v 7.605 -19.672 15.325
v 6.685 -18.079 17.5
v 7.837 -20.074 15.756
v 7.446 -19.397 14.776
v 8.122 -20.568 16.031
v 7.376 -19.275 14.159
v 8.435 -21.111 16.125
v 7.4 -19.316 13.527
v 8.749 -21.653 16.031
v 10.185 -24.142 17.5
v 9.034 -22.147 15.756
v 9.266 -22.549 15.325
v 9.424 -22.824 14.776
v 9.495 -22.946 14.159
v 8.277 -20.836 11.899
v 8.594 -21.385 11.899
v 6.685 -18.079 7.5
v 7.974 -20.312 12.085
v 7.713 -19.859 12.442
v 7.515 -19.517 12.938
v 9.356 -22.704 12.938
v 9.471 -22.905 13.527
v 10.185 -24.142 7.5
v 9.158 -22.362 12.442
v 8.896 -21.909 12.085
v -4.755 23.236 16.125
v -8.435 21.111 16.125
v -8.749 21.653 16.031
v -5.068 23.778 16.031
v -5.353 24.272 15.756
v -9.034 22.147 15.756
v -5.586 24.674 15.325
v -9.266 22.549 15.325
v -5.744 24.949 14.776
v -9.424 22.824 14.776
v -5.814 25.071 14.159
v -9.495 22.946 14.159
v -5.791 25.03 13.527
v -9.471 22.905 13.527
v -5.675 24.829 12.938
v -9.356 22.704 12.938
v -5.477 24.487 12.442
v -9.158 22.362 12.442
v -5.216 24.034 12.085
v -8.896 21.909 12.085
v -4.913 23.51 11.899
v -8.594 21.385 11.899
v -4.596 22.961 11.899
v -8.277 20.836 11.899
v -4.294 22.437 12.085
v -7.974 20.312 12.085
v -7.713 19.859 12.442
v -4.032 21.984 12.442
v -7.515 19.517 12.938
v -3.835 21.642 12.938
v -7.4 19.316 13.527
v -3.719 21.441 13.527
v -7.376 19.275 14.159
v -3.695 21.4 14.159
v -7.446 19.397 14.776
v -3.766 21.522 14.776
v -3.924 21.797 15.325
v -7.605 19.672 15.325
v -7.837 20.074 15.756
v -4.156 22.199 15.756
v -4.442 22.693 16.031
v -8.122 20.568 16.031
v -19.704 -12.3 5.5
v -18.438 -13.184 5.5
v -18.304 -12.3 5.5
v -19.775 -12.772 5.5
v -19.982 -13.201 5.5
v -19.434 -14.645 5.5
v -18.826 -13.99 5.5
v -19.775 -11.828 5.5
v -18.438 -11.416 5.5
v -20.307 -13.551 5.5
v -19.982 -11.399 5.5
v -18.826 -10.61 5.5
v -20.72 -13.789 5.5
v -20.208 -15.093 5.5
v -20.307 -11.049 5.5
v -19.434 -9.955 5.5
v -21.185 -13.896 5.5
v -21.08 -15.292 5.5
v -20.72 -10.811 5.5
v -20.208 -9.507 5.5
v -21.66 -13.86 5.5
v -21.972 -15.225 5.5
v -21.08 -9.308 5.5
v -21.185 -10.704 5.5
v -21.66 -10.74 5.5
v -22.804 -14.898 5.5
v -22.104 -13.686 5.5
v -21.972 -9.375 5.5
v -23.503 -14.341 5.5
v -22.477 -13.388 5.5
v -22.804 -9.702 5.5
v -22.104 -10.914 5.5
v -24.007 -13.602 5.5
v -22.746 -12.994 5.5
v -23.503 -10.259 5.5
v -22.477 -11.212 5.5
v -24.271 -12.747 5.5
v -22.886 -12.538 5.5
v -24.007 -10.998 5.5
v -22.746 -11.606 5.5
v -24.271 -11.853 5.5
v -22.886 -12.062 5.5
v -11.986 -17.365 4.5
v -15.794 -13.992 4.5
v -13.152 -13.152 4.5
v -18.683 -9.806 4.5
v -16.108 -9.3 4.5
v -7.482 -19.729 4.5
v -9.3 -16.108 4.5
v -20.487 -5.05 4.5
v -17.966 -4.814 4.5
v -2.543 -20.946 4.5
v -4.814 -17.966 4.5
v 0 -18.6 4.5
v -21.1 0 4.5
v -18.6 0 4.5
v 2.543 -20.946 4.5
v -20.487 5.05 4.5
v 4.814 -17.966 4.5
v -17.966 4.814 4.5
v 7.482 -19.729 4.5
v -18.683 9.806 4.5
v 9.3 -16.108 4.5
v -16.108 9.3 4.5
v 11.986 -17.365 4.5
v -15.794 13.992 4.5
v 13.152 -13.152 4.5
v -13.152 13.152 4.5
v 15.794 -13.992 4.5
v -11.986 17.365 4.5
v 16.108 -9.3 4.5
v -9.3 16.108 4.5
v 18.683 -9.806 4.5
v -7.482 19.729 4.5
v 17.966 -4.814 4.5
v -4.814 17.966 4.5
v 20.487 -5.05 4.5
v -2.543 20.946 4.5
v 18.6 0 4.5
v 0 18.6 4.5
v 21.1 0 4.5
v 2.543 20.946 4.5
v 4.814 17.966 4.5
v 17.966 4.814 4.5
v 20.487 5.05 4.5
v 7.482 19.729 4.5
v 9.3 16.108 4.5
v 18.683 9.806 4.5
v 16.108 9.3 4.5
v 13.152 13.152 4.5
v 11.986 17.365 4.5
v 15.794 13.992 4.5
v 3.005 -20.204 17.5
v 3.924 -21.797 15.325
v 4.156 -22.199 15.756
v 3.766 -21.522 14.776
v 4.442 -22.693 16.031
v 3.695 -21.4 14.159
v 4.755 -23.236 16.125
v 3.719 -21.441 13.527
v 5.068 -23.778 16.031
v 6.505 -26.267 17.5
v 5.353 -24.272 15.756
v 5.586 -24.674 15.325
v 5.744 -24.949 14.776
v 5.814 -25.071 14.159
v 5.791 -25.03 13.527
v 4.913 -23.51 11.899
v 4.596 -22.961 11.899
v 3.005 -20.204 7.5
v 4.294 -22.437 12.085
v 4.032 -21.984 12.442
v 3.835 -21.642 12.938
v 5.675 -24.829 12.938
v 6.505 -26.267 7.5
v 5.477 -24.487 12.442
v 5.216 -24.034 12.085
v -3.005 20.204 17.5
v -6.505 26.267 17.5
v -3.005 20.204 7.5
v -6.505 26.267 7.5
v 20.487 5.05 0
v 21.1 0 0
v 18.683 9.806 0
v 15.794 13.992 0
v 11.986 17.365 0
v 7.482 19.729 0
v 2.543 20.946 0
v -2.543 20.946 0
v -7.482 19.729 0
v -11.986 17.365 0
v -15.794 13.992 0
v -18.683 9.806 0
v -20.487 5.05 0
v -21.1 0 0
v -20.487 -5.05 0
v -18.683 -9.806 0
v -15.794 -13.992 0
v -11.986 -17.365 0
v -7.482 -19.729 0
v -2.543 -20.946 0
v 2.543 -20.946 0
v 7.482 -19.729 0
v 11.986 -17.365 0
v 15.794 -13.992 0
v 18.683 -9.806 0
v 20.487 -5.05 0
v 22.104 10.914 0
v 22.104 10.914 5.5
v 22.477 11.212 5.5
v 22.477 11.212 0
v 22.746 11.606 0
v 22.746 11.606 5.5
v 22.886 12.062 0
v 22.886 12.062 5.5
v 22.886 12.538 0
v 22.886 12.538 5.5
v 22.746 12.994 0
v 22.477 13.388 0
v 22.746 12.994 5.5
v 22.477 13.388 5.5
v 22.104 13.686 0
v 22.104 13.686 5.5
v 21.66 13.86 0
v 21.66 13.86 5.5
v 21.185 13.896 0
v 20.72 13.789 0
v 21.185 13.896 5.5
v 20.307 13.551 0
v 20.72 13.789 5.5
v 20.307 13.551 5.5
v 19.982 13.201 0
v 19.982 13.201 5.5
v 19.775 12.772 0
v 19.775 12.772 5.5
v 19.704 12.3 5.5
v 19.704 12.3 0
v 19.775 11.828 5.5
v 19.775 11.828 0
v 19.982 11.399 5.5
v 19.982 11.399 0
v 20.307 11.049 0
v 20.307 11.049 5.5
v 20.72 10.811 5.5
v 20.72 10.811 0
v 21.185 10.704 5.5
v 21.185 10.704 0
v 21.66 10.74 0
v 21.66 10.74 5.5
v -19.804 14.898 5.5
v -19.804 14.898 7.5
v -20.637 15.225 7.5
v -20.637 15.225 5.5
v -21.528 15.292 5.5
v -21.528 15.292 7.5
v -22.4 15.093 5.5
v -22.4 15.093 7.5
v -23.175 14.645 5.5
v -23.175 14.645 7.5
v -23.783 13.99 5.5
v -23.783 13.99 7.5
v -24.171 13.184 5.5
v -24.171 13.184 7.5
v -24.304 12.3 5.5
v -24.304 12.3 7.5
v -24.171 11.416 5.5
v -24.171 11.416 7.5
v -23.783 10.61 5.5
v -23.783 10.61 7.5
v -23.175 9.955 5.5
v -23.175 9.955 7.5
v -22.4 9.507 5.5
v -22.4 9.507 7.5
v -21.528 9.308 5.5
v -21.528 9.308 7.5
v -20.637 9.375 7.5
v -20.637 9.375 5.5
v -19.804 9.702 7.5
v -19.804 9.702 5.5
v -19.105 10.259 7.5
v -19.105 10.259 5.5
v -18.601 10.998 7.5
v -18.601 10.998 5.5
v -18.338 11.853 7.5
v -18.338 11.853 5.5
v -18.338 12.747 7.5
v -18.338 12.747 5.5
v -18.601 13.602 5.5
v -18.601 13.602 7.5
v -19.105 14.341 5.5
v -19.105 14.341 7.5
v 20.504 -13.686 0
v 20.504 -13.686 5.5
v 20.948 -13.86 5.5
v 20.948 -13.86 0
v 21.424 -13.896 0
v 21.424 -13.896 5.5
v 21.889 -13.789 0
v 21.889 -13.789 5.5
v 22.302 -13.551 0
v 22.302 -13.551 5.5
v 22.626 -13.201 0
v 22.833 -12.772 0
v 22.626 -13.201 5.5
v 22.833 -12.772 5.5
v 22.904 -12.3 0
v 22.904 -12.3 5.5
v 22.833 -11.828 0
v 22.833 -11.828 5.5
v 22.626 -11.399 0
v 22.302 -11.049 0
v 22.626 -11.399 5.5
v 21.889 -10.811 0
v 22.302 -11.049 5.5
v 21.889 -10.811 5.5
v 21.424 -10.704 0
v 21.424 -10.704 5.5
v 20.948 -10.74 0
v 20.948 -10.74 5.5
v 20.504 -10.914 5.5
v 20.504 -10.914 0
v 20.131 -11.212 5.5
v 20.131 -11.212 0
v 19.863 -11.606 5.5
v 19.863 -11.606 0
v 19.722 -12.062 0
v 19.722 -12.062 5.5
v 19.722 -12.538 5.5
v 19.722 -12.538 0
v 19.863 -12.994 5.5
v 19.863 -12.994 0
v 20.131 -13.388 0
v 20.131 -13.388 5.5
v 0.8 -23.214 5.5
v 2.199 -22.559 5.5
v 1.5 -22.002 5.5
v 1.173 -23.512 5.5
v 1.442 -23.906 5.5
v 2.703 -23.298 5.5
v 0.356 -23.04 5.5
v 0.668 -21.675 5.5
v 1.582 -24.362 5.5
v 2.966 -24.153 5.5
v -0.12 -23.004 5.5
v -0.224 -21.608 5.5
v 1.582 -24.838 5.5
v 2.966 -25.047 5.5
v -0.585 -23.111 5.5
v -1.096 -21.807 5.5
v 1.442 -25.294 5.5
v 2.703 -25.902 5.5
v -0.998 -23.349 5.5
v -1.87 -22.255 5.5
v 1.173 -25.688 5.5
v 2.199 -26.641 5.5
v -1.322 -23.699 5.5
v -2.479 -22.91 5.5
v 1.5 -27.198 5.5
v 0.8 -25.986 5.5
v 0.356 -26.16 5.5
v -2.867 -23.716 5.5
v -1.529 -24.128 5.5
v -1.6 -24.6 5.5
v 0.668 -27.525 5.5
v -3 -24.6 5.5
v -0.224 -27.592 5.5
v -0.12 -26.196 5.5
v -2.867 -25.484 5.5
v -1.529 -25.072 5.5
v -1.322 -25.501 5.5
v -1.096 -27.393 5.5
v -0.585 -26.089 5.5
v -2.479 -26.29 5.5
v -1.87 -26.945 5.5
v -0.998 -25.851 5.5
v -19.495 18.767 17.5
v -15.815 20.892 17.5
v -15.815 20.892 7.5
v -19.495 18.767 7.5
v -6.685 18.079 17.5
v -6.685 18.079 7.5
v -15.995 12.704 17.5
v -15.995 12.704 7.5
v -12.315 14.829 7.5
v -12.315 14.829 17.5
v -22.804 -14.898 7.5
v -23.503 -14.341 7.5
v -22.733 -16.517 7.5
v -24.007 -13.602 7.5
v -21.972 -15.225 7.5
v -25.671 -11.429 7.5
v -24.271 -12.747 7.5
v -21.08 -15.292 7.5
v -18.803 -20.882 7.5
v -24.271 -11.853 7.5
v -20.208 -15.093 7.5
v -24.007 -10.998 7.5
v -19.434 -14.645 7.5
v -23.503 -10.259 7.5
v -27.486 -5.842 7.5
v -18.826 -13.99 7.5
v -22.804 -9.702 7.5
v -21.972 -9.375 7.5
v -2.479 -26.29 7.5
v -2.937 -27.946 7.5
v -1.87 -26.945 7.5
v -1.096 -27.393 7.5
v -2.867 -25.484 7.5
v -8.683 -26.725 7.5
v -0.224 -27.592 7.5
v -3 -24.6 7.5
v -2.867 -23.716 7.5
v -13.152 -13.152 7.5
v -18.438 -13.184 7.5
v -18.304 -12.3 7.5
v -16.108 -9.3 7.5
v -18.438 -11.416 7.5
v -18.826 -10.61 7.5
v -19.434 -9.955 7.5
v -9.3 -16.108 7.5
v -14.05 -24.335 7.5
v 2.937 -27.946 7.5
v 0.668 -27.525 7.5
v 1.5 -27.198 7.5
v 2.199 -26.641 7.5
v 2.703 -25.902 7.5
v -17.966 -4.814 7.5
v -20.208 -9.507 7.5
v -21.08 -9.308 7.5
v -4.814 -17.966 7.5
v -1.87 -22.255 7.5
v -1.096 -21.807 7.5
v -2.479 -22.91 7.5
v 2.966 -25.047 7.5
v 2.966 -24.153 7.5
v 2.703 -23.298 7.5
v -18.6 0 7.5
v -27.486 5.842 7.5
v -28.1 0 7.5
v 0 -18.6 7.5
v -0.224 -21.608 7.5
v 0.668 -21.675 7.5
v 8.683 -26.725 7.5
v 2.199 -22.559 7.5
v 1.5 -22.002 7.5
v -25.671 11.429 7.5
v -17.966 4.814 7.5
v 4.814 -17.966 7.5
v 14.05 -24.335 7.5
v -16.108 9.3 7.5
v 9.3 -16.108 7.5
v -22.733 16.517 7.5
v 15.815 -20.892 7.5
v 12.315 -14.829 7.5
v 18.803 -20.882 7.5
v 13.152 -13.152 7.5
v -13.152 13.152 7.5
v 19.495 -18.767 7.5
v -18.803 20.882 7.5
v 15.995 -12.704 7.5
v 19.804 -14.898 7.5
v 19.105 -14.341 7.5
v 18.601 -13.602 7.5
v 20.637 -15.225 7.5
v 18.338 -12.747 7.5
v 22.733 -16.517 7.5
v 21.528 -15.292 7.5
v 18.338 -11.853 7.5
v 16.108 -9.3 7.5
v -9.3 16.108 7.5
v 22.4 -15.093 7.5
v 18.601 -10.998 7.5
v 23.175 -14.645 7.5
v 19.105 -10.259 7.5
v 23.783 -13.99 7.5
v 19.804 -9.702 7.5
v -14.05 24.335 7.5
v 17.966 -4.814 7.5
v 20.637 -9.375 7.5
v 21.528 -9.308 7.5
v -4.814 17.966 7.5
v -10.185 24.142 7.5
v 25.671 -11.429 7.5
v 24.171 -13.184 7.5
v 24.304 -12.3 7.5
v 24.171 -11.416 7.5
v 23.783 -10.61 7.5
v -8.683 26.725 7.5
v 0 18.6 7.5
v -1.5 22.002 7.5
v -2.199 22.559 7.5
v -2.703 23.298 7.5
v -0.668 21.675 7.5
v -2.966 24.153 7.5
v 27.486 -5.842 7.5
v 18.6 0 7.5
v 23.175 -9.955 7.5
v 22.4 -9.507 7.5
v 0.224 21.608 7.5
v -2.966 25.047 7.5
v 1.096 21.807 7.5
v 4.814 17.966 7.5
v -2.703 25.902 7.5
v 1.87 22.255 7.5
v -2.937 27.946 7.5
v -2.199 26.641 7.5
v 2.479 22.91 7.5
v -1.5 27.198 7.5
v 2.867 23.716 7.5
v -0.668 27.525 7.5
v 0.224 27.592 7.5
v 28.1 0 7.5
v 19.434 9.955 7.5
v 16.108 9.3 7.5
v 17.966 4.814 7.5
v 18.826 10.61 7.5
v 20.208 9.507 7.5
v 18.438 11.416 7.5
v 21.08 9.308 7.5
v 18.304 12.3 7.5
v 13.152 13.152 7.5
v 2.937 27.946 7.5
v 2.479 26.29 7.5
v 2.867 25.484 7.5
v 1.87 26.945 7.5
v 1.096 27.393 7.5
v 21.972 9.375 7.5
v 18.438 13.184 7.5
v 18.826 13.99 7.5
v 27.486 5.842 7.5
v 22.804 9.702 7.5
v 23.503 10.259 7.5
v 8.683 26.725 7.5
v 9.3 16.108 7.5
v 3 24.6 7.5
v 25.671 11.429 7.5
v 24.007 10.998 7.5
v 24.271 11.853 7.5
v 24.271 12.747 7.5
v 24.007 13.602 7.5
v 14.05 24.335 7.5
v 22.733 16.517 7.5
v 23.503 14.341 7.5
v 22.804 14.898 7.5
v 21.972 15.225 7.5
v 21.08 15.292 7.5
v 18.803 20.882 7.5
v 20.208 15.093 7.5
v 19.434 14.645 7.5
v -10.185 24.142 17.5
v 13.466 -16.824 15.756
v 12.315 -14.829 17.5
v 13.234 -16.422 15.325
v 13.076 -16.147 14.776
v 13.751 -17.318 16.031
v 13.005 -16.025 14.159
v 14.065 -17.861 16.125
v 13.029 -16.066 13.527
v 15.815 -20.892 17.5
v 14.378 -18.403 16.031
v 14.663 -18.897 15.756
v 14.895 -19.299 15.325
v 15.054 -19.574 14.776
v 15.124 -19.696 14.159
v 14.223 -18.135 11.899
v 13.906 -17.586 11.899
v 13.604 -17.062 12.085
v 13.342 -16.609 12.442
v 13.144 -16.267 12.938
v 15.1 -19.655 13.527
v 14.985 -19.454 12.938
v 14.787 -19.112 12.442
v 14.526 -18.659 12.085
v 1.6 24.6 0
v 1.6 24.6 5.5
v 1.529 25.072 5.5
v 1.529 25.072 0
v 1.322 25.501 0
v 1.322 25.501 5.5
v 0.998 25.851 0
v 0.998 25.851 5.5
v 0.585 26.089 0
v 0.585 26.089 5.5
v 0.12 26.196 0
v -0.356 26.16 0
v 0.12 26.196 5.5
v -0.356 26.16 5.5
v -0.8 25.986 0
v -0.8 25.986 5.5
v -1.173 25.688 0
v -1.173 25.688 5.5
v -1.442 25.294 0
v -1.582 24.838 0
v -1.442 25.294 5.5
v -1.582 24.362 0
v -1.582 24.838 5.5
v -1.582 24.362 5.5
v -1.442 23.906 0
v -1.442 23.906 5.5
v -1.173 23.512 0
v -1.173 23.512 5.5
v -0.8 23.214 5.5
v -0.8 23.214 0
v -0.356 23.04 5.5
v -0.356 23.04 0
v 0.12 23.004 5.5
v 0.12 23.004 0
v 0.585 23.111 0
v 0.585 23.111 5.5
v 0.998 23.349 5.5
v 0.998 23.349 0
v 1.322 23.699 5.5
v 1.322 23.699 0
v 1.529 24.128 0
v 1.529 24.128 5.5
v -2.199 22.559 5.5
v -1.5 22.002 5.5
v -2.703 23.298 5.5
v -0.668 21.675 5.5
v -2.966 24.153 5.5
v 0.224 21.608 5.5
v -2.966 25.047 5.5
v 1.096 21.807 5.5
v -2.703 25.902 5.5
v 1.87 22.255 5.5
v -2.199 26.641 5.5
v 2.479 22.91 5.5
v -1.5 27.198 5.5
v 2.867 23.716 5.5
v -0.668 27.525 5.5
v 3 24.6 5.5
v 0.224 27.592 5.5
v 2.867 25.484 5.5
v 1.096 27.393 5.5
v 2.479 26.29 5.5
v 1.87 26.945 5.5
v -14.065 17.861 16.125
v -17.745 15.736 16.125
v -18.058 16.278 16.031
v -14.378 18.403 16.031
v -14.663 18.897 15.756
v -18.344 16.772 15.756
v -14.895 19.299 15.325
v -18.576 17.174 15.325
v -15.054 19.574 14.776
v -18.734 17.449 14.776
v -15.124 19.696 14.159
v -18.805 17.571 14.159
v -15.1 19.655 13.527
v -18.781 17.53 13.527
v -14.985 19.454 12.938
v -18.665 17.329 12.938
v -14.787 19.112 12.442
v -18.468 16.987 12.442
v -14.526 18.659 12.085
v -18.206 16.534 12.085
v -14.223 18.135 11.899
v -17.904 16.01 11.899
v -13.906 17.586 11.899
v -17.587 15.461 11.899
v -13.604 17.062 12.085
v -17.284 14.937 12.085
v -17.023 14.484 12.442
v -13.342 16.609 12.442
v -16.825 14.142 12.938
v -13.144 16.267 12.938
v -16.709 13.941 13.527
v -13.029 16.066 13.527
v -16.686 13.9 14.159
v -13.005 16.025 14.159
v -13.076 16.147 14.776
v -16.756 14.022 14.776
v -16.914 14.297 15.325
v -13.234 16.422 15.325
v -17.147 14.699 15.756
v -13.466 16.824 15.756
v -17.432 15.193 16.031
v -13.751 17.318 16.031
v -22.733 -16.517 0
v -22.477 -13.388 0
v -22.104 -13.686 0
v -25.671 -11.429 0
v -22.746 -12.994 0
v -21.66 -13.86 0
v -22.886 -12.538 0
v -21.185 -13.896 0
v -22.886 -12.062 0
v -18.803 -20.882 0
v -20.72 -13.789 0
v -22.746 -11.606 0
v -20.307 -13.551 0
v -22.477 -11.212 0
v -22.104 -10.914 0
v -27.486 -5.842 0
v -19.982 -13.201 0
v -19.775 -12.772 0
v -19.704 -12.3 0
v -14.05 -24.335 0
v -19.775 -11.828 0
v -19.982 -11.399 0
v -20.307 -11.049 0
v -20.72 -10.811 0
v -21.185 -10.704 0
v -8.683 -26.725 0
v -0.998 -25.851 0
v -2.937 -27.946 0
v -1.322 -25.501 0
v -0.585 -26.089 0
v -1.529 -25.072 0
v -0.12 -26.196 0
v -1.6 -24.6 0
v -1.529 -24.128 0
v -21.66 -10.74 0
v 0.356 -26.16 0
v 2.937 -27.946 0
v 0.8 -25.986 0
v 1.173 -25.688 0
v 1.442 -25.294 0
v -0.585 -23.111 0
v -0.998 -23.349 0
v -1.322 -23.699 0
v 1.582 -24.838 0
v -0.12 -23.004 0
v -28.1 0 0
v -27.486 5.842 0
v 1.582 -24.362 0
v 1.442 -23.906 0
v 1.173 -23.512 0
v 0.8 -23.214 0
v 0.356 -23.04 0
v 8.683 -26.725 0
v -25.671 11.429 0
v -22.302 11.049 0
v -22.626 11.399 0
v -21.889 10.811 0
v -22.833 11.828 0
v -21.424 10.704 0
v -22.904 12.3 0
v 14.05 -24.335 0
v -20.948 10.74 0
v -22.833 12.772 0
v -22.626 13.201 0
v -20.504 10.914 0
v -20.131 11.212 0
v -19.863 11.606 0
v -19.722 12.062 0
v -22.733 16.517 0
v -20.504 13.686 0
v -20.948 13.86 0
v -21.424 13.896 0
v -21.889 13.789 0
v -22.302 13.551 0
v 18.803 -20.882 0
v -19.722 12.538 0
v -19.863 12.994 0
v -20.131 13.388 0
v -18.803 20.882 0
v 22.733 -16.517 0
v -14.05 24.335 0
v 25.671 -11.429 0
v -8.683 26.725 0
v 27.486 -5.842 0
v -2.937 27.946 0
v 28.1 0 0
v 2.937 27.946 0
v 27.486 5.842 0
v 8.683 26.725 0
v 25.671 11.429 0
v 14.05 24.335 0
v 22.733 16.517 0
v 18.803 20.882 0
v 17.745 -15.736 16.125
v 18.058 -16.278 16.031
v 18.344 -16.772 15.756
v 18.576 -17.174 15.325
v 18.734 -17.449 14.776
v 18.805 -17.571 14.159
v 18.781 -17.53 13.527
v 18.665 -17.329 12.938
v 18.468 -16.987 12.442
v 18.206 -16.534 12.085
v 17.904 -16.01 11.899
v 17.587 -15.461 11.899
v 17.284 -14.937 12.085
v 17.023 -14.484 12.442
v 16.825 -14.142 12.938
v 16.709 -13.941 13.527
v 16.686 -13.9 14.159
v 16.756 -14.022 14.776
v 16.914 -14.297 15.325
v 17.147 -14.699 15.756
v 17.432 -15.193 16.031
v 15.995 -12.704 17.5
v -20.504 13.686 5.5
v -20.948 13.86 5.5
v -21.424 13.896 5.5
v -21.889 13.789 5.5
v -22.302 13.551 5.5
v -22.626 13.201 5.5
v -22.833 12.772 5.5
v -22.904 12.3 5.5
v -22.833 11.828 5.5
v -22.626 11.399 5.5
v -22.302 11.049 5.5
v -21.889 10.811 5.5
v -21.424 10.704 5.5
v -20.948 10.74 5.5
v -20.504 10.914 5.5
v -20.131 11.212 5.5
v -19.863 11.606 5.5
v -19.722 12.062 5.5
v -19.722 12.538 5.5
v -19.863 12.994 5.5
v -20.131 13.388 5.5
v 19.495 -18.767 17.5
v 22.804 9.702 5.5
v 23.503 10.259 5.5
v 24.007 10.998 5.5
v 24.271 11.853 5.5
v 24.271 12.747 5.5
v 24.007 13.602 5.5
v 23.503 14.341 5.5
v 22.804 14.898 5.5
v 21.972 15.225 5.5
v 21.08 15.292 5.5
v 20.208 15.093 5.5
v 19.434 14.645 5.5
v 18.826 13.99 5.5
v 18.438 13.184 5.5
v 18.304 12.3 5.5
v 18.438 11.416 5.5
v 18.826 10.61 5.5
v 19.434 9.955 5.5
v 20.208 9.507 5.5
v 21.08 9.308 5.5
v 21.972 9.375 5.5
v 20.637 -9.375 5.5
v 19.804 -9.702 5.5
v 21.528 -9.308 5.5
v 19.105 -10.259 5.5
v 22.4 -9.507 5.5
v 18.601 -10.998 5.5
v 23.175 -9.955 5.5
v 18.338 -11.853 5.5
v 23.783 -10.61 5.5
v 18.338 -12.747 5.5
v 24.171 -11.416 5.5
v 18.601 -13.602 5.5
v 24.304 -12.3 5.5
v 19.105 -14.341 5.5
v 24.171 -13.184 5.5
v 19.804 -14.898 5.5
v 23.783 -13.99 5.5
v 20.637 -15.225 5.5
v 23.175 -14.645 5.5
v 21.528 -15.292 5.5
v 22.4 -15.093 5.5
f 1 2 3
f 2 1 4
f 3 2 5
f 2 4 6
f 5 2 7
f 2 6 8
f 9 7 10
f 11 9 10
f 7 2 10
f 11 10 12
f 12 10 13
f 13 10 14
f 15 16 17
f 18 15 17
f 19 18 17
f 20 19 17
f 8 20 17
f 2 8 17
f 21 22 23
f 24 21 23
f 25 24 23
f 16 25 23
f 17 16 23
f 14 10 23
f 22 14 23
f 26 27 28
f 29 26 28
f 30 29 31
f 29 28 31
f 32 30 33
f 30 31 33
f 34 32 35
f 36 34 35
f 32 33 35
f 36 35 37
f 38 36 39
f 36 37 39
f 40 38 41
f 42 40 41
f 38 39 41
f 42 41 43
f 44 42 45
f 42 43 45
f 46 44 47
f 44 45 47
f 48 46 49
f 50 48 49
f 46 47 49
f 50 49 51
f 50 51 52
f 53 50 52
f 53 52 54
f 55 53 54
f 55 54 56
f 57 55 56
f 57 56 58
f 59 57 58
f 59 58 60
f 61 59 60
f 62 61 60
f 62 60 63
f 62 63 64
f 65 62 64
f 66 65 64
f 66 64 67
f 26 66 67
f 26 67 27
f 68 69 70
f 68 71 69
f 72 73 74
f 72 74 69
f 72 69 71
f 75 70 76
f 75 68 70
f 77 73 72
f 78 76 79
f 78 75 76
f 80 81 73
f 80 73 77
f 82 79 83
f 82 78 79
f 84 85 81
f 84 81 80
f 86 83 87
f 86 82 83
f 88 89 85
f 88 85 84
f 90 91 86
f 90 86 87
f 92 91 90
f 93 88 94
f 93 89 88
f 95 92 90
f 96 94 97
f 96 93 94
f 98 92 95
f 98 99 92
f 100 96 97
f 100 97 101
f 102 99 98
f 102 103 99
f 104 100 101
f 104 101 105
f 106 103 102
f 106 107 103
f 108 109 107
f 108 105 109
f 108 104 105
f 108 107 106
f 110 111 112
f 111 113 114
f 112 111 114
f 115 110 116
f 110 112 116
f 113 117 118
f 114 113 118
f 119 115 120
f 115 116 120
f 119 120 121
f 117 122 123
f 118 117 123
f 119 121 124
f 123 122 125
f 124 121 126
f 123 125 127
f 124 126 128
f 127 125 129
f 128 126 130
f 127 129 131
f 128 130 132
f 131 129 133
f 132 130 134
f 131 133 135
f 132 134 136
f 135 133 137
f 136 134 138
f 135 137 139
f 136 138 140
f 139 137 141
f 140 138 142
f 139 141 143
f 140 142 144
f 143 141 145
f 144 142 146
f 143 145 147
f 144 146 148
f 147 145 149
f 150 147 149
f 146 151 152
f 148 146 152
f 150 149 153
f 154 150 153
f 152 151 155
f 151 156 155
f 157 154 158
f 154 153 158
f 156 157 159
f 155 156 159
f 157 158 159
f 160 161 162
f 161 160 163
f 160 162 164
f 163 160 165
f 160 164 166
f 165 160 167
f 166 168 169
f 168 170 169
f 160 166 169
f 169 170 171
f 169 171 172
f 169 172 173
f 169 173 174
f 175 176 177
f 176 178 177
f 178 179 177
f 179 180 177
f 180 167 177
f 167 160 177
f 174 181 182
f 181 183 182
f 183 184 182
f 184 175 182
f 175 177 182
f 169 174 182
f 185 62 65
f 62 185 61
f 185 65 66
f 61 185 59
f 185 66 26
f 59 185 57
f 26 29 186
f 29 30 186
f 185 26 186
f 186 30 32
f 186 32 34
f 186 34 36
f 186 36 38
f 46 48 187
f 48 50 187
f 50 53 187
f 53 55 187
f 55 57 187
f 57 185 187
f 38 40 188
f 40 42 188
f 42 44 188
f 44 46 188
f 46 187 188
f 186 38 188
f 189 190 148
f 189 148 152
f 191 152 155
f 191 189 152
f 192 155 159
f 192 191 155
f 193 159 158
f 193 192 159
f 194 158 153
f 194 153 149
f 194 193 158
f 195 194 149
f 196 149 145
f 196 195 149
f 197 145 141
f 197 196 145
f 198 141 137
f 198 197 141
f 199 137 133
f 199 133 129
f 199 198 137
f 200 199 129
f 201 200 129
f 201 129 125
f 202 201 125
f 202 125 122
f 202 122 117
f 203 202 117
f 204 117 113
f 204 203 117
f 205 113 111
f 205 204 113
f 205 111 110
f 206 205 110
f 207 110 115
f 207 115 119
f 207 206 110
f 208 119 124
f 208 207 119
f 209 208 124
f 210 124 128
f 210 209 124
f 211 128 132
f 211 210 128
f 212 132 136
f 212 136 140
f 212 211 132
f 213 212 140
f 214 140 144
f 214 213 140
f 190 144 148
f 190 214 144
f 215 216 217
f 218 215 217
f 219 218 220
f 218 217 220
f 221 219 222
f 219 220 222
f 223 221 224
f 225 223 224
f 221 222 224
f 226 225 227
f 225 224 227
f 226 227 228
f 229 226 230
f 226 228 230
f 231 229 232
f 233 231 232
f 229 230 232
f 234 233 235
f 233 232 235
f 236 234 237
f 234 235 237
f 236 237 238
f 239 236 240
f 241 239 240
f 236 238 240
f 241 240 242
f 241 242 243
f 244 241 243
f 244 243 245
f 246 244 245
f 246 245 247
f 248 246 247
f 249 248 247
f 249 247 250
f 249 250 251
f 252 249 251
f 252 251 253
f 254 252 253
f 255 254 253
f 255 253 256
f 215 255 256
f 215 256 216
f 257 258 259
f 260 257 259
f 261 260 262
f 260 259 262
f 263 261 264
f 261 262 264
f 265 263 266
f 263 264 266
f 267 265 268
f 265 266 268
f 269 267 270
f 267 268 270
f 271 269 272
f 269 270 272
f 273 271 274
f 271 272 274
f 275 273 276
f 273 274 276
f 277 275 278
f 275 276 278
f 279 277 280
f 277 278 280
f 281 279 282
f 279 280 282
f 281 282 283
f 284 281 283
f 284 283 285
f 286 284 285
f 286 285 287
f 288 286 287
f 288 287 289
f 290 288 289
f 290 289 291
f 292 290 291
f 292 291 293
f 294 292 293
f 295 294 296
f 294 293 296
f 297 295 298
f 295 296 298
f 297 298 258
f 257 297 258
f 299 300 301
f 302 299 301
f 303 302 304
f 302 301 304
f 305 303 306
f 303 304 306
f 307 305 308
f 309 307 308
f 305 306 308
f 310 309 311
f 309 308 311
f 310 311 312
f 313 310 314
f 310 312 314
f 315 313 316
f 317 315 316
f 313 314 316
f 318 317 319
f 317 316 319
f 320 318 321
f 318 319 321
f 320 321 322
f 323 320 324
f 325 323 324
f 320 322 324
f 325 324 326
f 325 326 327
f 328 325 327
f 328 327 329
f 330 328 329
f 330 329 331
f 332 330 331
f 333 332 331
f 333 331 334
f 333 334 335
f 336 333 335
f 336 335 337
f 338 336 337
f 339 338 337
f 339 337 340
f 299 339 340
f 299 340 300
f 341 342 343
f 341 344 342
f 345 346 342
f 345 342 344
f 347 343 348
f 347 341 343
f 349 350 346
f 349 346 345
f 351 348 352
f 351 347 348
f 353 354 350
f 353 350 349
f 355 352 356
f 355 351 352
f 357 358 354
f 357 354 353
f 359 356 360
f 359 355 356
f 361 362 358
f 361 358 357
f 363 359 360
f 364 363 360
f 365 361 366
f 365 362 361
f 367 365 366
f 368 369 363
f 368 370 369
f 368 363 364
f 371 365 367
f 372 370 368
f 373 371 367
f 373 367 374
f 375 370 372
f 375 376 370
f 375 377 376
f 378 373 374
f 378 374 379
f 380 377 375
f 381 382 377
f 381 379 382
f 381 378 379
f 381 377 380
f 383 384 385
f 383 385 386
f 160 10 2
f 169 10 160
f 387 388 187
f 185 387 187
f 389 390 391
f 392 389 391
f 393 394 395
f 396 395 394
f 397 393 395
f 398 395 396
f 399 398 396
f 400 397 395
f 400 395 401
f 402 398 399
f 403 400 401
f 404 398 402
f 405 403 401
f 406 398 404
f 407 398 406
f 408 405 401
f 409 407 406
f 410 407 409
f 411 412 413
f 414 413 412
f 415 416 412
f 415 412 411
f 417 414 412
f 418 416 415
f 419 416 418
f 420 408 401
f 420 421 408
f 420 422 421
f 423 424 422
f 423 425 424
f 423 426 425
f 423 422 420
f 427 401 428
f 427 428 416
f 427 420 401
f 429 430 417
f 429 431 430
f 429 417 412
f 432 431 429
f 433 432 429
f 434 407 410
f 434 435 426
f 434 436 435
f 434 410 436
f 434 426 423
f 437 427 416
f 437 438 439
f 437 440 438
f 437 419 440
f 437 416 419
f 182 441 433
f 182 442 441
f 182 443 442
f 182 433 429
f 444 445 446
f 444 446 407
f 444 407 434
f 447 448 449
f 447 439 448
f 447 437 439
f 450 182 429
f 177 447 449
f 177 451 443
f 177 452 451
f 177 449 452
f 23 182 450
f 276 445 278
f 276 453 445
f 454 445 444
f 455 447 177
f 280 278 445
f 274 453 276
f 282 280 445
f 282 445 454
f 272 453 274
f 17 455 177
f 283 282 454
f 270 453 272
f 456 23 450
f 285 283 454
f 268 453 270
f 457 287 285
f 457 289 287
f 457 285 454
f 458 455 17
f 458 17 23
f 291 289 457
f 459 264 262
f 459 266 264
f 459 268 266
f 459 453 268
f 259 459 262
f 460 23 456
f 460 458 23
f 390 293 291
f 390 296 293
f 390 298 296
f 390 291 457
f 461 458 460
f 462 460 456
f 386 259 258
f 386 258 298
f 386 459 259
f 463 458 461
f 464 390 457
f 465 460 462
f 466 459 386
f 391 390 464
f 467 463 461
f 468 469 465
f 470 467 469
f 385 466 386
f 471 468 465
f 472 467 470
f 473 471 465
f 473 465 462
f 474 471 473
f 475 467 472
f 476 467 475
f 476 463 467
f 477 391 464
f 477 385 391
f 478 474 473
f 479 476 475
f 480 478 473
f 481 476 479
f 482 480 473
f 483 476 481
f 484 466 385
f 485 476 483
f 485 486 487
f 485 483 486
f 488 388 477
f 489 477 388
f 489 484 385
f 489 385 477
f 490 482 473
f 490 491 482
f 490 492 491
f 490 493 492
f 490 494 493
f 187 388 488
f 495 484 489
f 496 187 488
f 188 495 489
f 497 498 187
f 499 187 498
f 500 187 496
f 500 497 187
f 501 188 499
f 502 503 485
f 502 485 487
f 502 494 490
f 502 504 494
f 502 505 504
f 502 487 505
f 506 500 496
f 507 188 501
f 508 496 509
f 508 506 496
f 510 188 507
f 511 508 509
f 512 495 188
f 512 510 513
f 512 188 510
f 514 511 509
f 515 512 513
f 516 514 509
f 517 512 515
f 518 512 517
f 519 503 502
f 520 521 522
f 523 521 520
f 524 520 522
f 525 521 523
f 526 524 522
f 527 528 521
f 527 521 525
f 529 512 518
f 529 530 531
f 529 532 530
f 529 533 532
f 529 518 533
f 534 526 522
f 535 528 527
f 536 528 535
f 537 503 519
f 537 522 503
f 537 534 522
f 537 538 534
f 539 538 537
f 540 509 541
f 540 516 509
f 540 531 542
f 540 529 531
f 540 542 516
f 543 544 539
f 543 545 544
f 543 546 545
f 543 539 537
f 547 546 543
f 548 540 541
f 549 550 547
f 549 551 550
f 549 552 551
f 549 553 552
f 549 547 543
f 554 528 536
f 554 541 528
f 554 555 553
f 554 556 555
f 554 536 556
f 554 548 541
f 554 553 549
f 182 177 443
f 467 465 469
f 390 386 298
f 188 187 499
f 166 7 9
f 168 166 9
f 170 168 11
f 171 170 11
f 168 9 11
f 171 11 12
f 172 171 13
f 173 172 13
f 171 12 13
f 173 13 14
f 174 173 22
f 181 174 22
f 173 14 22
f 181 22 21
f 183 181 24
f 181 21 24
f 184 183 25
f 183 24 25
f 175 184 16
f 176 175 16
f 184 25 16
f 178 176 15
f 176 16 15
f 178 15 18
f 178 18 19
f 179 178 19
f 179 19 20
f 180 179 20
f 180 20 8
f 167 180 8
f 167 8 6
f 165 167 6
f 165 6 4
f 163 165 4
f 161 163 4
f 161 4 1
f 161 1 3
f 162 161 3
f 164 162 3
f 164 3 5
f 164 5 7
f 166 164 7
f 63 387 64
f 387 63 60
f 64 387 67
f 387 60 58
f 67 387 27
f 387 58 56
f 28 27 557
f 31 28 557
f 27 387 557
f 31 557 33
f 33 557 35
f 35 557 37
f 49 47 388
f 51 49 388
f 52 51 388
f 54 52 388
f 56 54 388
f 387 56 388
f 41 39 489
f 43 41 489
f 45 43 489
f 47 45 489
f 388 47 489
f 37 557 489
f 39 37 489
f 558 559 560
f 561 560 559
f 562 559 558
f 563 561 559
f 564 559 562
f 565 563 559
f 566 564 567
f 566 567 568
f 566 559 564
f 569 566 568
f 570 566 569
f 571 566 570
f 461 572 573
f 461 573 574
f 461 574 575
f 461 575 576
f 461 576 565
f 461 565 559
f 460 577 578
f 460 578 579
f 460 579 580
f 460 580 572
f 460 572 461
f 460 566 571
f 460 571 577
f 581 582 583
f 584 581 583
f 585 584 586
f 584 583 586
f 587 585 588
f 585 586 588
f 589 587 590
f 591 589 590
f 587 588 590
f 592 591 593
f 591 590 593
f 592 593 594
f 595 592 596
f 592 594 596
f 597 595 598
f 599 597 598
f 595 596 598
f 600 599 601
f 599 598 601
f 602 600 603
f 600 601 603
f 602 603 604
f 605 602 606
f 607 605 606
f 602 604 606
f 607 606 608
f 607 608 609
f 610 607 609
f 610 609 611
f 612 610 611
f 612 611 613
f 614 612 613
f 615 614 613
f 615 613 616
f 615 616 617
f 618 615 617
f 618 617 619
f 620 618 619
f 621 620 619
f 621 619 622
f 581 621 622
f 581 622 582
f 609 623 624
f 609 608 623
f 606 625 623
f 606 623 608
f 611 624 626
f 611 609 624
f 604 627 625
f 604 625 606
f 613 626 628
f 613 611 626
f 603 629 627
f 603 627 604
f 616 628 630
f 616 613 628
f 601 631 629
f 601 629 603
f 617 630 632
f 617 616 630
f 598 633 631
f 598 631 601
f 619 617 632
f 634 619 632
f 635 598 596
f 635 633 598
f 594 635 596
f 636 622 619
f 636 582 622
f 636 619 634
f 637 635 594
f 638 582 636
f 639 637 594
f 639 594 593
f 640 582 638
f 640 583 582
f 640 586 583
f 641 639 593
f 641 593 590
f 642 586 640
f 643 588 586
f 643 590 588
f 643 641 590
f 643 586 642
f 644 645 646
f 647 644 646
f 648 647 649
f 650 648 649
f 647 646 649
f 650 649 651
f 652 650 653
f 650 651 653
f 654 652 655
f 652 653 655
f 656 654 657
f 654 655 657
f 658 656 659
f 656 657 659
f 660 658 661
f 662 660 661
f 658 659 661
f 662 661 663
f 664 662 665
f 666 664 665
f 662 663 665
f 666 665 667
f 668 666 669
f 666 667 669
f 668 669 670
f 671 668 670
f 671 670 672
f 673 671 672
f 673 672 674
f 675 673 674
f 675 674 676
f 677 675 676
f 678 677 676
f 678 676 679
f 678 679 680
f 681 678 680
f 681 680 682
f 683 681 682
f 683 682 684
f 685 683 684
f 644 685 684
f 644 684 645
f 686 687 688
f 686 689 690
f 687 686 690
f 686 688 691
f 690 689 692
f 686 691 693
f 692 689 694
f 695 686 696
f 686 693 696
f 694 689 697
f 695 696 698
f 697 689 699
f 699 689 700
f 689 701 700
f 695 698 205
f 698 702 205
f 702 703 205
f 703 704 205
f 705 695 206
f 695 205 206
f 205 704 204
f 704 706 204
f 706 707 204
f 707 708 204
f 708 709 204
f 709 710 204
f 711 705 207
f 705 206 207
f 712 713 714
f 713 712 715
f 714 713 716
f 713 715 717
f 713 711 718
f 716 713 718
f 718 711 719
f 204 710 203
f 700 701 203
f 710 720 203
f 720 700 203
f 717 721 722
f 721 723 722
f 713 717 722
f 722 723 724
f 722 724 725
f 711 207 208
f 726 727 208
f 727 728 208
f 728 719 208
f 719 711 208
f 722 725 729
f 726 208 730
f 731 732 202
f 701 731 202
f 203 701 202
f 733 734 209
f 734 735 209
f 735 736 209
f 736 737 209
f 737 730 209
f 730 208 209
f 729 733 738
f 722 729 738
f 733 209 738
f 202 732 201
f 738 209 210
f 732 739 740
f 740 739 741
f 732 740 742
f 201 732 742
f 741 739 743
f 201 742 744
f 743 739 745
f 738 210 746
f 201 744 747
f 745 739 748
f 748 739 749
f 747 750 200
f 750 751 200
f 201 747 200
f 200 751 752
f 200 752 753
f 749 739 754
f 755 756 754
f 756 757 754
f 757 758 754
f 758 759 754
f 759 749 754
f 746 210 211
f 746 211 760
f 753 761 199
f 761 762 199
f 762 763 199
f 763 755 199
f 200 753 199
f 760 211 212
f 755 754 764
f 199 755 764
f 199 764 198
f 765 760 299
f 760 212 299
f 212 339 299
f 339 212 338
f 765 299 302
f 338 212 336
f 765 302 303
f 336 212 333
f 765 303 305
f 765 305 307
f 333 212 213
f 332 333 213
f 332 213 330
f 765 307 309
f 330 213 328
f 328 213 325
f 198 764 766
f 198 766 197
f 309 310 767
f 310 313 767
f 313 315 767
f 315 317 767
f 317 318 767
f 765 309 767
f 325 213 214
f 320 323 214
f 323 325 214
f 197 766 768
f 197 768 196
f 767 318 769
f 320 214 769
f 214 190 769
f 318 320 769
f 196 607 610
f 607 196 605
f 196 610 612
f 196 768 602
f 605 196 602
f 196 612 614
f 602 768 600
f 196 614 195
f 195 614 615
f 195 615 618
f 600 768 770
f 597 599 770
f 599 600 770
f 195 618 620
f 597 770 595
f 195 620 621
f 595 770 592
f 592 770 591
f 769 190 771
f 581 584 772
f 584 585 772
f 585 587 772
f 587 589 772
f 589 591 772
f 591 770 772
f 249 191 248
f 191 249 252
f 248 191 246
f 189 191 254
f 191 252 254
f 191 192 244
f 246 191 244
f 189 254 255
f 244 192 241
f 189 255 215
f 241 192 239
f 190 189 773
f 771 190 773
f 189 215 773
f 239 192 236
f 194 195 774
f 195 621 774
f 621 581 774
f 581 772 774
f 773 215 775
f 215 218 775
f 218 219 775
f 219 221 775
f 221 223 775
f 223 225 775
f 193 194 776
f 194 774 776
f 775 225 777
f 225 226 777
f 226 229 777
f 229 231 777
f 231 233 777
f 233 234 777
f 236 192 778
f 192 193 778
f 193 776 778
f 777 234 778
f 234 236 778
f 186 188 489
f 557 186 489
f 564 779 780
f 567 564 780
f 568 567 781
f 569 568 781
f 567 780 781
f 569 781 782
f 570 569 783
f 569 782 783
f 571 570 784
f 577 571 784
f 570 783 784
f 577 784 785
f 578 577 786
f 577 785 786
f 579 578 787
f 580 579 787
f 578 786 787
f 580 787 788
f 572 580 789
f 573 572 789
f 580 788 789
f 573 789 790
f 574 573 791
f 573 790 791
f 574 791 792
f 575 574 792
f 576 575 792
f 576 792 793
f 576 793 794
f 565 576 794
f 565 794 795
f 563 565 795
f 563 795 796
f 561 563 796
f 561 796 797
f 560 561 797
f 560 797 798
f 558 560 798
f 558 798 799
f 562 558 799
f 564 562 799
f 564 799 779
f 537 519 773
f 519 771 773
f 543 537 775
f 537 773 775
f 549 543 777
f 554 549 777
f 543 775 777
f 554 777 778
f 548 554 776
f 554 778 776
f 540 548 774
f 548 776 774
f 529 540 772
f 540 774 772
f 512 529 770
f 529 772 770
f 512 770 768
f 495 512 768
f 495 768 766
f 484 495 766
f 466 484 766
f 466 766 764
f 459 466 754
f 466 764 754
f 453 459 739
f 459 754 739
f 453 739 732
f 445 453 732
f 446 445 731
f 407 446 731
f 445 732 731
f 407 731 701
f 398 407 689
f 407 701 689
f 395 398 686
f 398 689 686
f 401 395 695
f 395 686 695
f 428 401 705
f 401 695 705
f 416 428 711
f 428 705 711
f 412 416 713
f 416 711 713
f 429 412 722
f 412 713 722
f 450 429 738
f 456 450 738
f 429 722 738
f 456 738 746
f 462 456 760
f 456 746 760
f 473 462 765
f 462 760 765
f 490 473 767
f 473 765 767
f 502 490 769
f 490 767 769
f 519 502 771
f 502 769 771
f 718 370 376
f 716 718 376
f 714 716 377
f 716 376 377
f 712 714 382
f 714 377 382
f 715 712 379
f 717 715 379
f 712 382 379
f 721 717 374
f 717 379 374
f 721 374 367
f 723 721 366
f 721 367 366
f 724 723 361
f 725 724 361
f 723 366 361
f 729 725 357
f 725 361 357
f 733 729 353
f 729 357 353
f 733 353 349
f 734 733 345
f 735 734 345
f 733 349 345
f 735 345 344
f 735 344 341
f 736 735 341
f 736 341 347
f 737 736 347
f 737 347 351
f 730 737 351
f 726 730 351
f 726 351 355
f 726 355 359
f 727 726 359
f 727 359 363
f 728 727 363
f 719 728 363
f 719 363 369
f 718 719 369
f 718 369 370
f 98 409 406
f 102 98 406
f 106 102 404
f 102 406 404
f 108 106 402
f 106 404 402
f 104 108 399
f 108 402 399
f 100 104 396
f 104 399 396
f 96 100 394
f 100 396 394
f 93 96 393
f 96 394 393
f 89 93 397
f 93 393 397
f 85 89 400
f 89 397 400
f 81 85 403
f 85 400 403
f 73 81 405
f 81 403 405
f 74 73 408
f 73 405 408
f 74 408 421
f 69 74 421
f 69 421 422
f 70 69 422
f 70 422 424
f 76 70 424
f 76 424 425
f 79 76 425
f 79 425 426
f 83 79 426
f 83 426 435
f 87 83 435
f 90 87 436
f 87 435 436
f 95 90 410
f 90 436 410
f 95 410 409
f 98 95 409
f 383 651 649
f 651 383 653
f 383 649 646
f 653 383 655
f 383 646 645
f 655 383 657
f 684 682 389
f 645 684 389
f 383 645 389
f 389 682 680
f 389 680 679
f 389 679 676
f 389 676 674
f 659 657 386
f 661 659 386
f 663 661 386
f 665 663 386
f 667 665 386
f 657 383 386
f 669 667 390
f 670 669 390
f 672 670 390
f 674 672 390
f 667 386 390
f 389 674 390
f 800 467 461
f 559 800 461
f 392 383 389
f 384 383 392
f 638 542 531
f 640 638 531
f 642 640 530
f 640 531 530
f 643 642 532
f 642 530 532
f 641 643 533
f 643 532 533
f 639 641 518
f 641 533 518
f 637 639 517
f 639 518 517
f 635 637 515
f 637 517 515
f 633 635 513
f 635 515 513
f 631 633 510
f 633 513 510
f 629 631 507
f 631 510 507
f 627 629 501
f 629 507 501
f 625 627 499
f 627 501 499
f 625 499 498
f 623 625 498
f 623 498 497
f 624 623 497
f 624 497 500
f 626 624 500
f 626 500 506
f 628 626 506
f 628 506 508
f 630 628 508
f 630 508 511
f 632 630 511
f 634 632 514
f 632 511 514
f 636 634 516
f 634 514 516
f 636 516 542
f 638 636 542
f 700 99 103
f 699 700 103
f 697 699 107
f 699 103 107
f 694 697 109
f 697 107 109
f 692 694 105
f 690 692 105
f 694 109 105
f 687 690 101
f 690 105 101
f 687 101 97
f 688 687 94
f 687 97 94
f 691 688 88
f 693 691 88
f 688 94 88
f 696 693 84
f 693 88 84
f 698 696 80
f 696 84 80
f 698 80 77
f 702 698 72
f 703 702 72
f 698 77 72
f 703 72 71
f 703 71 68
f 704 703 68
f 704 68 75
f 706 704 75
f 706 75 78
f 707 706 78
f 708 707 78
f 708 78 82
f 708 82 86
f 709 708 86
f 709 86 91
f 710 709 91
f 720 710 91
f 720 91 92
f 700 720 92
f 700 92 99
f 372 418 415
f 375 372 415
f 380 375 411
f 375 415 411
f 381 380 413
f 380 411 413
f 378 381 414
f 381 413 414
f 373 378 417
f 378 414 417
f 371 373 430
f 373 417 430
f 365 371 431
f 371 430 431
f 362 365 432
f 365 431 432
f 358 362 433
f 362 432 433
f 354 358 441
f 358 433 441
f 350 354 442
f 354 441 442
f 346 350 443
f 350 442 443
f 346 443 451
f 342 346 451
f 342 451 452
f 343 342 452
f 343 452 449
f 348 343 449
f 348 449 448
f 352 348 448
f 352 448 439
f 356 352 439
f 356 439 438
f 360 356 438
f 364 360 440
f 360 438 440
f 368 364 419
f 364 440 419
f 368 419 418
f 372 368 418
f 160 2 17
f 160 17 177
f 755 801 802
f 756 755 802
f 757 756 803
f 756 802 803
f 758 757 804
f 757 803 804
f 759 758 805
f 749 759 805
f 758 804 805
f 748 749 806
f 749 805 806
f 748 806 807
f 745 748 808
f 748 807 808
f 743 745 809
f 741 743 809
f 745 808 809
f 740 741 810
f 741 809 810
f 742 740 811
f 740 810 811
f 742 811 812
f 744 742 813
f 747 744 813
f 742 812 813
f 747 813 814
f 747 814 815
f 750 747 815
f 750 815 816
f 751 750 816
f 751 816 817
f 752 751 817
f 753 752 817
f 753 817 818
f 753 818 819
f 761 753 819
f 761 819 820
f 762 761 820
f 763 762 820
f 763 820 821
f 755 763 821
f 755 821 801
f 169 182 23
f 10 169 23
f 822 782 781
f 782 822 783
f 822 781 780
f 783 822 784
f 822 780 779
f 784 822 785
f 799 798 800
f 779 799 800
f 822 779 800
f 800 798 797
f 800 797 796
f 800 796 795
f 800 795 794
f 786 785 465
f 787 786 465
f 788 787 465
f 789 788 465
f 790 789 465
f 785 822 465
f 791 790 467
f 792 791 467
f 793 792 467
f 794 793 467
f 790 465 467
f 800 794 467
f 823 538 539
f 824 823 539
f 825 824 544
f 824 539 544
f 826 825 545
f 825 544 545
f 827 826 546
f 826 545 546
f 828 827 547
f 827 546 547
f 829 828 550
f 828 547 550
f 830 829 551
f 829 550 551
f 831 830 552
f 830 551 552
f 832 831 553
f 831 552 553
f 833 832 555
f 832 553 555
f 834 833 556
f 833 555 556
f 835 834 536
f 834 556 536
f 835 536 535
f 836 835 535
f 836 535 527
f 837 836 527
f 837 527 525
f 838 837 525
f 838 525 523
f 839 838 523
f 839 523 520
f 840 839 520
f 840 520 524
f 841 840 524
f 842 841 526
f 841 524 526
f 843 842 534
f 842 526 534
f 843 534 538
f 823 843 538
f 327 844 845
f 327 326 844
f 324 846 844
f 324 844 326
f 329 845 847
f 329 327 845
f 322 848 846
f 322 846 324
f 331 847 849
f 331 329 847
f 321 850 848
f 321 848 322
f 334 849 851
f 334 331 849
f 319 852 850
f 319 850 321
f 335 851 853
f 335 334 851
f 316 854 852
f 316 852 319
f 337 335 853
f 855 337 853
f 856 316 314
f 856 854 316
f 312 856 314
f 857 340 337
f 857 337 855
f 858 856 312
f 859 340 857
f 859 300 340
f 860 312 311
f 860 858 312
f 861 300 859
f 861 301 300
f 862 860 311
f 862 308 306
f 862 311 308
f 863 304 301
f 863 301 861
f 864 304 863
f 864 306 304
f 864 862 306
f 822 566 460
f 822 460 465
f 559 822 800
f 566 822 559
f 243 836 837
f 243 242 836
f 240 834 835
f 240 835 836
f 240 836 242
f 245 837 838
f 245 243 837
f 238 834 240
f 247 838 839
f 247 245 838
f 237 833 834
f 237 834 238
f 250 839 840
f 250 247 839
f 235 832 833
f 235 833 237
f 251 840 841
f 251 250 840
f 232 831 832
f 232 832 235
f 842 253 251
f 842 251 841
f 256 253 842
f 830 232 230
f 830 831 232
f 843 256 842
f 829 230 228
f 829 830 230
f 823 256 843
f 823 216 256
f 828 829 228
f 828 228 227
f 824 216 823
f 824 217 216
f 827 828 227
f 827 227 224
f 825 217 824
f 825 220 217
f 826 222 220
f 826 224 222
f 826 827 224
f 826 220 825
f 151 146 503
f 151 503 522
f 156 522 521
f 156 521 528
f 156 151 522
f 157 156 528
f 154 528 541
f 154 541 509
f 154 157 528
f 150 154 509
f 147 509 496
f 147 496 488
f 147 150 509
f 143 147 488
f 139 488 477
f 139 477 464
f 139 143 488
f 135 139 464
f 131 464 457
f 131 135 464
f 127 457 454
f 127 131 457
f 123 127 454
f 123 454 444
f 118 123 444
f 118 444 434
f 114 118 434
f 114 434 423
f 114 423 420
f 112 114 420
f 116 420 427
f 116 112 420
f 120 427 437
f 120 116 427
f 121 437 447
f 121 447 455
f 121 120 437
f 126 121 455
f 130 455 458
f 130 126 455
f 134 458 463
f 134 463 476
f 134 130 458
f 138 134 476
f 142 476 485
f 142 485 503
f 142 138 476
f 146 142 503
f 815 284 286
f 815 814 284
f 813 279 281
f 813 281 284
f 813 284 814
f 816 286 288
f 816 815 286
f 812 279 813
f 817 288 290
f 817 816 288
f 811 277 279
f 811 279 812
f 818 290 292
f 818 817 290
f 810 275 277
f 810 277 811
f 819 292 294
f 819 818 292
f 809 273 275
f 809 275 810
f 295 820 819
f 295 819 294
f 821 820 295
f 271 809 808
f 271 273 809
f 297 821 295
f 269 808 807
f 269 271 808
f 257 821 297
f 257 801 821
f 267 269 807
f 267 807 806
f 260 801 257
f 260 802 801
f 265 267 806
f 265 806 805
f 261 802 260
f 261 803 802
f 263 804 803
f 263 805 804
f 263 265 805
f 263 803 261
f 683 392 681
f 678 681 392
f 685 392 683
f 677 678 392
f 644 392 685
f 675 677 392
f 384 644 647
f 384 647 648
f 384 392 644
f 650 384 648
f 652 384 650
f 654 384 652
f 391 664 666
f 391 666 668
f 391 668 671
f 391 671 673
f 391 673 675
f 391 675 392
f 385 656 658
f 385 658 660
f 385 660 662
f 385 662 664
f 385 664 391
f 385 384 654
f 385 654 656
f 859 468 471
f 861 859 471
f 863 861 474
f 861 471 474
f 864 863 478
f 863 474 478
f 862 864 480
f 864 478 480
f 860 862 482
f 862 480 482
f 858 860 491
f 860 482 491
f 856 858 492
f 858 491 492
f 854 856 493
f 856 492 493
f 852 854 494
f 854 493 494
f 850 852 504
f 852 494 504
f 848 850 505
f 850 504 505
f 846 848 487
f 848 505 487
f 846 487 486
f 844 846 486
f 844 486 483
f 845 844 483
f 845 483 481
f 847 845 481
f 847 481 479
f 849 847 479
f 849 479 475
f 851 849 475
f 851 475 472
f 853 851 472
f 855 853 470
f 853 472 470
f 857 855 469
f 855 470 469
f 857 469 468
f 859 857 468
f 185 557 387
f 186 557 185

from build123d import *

# Parameters (mm, degrees)
SKETCH1_R            = 28.1
SKETCH1_R_2          = 21.1
BOSS_EXTRUDE1_DEPTH  = 4.5
SKETCH2_R            = 28.1
SKETCH2_R_2          = 18.6
BOSS_EXTRUDE2_DEPTH  = 3
M3_CLEARANCE_HOLE1_D = 3.2
SKETCH6_R            = 3
CUT_EXTRUDE1_DEPTH   = 2
BOSS_EXTRUDE3_DEPTH  = 10
SKETCH8_R            = 2.125
CUT_EXTRUDE2_DEPTH   = 15
SKETCH9_W            = 6.5
SKETCH9_H            = 10
CUT_EXTRUDE3_DEPTH   = 7
CIRPATTERN1_COUNT    = 6
CIRPATTERN2_COUNT    = 2


with BuildPart() as part:
    # Sketch1 → Boss-Extrude1 (new body)
    with BuildSketch(Plane.XY):
        Circle(SKETCH1_R)
        Circle(SKETCH1_R_2, mode=Mode.SUBTRACT)
    extrude(amount=BOSS_EXTRUDE1_DEPTH)

    # Sketch2 → Boss-Extrude2 (add)
    with BuildSketch(Plane.XY.offset(4.5)):
        Circle(SKETCH2_R)
        Circle(SKETCH2_R_2, mode=Mode.SUBTRACT)
    extrude(amount=BOSS_EXTRUDE2_DEPTH)

    # M3 Clearance Hole1 (through all)
    with Locations(Plane(origin=(0, 0, 0), x_dir=(-1, 0, 0), z_dir=(0, 0, -1))):
        with Locations((0, 24.6)):
            m3_clearance_hole1 = Hole(M3_CLEARANCE_HOLE1_D / 2)

    # Sketch6 → Cut-Extrude1 (cut)
    with BuildSketch(Plane.XY.offset(7.5)):
        with Locations((0, 24.6)):
            Circle(SKETCH6_R)
    cut_extrude1 = extrude(amount=-CUT_EXTRUDE1_DEPTH, mode=Mode.SUBTRACT)

    # Sketch7 → Boss-Extrude3 (add)
    with BuildSketch(Plane.XY.offset(7.5)):
        Polygon((-6.504809472, 26.266660498), (-19.495190528, 18.766660498), (-15.995190528, 12.704482672), (-3.004809472, 20.204482672), align=None)
    boss_extrude3 = extrude(amount=BOSS_EXTRUDE3_DEPTH)

    # Sketch8 → Cut-Extrude2 (cut)
    with BuildSketch(Plane(origin=(-6.495190528, -3.75, 0), x_dir=(0, 0, 1), z_dir=(-0.866025404, -0.5, 0))):
        with Locations((14, 22.5)):
            Circle(SKETCH8_R)
    cut_extrude2 = extrude(amount=-CUT_EXTRUDE2_DEPTH, mode=Mode.SUBTRACT)

    # Sketch9 → Cut-Extrude3 (cut)
    with BuildSketch(Plane(origin=(-13, 22.516660498, 0), x_dir=(0.866025404, 0.5, 0), z_dir=(-0.5, 0.866025404, 0))):
        with Locations((0, -12.5)):
            Rectangle(SKETCH9_W, SKETCH9_H)
    cut_extrude3 = extrude(amount=-CUT_EXTRUDE3_DEPTH, mode=Mode.SUBTRACT)

    # CirPattern1: M3 Clearance Hole1, Cut-Extrude1 ×6 about axis
    cirpattern1_axis = Axis((0, 0, 0), (0, 0, 1))
    for i in range(1, CIRPATTERN1_COUNT):
        add(m3_clearance_hole1.rotate(cirpattern1_axis, i * 360 / CIRPATTERN1_COUNT), mode=Mode.SUBTRACT)
        add(cut_extrude1.rotate(cirpattern1_axis, i * 360 / CIRPATTERN1_COUNT), mode=Mode.SUBTRACT)

    # CirPattern2: Boss-Extrude3, Cut-Extrude2, Cut-Extrude3 ×2 about axis
    cirpattern2_axis = Axis((0, 0, 0), (0, 0, 1))
    for i in range(1, CIRPATTERN2_COUNT):
        add(boss_extrude3.rotate(cirpattern2_axis, i * 360 / CIRPATTERN2_COUNT))
        add(cut_extrude2.rotate(cirpattern2_axis, i * 360 / CIRPATTERN2_COUNT), mode=Mode.SUBTRACT)
        add(cut_extrude3.rotate(cirpattern2_axis, i * 360 / CIRPATTERN2_COUNT), mode=Mode.SUBTRACT)


solid = part.part
